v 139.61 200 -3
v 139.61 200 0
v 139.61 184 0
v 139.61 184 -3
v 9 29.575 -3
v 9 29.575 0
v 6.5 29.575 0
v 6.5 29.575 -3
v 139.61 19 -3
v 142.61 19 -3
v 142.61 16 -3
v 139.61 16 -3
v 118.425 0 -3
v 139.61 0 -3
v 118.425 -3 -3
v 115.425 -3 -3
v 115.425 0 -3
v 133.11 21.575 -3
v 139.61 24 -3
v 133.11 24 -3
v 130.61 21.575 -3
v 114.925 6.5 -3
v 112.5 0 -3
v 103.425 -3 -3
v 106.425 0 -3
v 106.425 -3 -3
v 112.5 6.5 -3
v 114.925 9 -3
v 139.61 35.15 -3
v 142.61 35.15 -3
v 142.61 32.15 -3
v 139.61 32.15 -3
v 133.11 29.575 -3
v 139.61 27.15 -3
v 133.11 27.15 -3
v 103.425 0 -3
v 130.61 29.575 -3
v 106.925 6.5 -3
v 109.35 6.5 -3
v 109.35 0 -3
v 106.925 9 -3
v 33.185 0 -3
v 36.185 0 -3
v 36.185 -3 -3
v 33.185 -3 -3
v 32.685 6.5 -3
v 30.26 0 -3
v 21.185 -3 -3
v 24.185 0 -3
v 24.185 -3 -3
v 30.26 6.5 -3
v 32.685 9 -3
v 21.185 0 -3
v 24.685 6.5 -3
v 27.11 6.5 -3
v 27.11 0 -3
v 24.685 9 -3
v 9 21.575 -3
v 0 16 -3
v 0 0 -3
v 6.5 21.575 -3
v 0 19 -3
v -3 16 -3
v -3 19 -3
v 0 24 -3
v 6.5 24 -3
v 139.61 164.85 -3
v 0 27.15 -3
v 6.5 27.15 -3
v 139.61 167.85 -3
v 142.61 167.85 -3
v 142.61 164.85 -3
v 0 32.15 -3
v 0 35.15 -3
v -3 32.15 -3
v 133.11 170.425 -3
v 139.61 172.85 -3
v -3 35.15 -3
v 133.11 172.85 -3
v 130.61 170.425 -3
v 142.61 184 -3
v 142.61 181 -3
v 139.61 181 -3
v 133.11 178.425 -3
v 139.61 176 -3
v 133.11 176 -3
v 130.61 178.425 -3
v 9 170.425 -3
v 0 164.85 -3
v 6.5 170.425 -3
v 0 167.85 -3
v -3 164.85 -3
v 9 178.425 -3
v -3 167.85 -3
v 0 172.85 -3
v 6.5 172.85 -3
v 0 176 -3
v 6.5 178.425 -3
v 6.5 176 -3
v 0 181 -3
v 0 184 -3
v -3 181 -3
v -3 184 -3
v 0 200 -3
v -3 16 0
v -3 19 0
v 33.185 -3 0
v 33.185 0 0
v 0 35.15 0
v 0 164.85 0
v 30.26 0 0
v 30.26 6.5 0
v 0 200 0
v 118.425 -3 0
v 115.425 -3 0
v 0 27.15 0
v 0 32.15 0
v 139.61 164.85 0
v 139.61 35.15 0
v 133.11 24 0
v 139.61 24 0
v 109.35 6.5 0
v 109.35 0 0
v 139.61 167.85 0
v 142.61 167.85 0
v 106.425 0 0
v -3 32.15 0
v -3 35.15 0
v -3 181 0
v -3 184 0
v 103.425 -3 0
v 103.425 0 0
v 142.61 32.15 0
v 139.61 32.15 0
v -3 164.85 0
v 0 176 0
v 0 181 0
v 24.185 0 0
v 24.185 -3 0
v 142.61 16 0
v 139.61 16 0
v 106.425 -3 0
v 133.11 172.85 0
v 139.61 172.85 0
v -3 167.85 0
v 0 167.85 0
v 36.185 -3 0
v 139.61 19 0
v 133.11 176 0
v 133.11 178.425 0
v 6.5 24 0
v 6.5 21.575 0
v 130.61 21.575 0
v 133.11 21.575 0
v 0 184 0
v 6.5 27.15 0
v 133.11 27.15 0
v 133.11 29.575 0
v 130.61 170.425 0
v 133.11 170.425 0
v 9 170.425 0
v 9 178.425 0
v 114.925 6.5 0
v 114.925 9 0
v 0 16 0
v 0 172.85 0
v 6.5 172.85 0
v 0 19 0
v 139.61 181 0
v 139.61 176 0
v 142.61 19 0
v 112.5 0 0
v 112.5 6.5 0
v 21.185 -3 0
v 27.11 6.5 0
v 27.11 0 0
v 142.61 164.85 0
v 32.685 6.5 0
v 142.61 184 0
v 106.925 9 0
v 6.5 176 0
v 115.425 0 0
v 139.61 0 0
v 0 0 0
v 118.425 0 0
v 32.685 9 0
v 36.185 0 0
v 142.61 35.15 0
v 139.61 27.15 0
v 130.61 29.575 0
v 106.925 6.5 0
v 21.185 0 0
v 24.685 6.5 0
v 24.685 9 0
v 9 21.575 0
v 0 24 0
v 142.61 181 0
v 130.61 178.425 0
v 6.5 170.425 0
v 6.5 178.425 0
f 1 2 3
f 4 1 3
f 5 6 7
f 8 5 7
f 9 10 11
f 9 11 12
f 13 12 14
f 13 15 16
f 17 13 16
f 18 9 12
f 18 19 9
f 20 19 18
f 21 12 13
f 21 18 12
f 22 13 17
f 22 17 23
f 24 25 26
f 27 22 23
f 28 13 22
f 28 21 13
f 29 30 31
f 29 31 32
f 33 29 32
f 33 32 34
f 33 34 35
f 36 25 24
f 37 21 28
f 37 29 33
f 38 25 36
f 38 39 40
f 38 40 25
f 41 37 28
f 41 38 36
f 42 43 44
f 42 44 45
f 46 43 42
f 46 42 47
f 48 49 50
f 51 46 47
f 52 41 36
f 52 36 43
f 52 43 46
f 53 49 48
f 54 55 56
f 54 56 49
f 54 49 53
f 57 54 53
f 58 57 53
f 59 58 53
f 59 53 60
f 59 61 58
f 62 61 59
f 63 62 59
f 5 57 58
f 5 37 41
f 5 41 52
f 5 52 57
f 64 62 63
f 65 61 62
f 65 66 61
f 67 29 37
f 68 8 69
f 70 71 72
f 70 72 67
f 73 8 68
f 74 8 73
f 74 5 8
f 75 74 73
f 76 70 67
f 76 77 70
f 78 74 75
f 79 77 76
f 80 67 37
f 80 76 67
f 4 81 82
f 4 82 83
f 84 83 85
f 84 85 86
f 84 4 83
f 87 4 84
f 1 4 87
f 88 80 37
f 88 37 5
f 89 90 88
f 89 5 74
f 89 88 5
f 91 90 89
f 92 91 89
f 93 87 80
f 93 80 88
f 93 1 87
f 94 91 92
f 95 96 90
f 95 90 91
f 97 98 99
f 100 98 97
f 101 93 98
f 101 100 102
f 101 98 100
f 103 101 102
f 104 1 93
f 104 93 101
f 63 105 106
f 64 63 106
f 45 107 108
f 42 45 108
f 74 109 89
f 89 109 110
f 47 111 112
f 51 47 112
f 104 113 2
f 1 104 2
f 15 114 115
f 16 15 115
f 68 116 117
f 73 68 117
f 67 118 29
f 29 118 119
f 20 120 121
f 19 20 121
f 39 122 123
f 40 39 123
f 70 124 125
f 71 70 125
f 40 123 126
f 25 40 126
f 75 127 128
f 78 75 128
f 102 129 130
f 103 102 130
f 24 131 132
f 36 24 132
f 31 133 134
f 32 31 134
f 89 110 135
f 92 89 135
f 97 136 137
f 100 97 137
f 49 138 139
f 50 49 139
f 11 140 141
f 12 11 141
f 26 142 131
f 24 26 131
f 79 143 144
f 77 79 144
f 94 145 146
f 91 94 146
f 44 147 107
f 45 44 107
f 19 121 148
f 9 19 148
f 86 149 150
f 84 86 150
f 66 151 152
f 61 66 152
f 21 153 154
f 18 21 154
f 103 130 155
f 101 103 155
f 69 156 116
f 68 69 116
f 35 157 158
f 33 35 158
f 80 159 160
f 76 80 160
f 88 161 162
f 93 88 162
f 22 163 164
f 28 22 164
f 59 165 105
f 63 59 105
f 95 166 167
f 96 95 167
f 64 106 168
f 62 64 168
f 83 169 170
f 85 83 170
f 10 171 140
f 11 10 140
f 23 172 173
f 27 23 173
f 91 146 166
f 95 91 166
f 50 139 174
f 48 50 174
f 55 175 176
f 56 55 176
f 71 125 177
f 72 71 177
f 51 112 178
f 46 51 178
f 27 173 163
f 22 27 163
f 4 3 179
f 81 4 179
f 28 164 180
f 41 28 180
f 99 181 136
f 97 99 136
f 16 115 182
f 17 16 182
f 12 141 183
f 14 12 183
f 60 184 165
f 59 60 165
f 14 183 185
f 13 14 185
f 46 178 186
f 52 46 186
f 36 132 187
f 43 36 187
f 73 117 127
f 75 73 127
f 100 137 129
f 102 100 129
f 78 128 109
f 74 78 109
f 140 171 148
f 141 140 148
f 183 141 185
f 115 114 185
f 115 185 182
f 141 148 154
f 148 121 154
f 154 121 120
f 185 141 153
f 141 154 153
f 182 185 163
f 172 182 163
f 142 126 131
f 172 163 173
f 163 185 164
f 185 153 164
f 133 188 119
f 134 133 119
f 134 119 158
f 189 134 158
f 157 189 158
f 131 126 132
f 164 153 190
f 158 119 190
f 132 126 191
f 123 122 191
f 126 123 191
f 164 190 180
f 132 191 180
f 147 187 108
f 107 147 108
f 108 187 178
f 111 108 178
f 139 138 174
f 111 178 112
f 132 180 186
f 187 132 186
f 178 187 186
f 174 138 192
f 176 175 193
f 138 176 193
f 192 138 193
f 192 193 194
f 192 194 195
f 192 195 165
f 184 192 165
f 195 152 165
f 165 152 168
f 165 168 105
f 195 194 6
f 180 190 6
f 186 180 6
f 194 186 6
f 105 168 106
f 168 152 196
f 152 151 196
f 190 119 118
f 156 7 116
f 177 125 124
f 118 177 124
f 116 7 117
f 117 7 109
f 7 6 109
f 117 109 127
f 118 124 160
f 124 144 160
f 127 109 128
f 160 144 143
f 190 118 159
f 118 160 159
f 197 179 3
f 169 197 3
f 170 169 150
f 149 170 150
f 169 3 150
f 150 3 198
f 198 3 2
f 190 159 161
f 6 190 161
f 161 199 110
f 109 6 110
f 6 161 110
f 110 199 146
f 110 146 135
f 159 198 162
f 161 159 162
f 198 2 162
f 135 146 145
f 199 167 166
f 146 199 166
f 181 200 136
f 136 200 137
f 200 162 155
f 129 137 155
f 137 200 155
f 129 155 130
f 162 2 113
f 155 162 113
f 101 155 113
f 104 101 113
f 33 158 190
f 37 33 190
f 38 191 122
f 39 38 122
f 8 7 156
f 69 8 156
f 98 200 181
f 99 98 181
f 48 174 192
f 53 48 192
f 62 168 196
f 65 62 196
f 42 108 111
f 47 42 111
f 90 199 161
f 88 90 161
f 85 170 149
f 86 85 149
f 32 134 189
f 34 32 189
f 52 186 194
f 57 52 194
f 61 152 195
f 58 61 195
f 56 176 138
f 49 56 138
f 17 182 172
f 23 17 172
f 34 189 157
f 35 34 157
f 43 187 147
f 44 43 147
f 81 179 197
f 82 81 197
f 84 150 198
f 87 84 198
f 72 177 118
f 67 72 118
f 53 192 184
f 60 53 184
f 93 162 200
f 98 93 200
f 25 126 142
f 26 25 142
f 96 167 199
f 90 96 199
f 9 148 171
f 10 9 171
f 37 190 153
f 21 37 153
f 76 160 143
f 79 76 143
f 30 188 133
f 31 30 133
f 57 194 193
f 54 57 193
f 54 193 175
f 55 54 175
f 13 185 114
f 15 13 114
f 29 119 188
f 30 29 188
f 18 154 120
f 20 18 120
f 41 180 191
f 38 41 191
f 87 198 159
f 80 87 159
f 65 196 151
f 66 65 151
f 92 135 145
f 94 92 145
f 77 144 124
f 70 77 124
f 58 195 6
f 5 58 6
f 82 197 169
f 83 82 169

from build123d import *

# Parameters (mm, degrees)
BOSS_EXTRUDE1_DEPTH = 3


with BuildPart() as part:
    # Sketch1 → Boss-Extrude1 (new body)
    with BuildSketch(Plane.XY):
        Polygon((0, 27.15), (0, 32.15), (-3, 32.15), (-3, 35.15), (0, 35.15), (0, 164.85), (-3, 164.85), (-3, 167.85), (0, 167.85), (0, 172.85), (6.5, 172.85), (6.5, 170.425), (9, 170.425), (9, 178.425), (6.5, 178.425), (6.5, 176), (0, 176), (0, 181), (-3, 181), (-3, 184), (0, 184), (0, 200), (139.61, 200), (139.61, 184), (142.61, 184), (142.61, 181), (139.61, 181), (139.61, 176), (133.11, 176), (133.11, 178.425), (130.61, 178.425), (130.61, 170.425), (133.11, 170.425), (133.11, 172.85), (139.61, 172.85), (139.61, 167.85), (142.61, 167.85), (142.61, 164.85), (139.61, 164.85), (139.61, 35.15), (142.61, 35.15), (142.61, 32.15), (139.61, 32.15), (139.61, 27.15), (133.11, 27.15), (133.11, 29.575), (130.61, 29.575), (130.61, 21.575), (133.11, 21.575), (133.11, 24), (139.61, 24), (139.61, 19), (142.61, 19), (142.61, 16), (139.61, 16), (139.61, 0), (118.425, 0), (118.425, -3), (115.425, -3), (115.425, 0), (112.5, 0), (112.5, 6.5), (114.925, 6.5), (114.925, 9), (106.925, 9), (106.925, 6.5), (109.35, 6.5), (109.35, 0), (106.425, 0), (106.425, -3), (103.425, -3), (103.425, 0), (36.185, 0), (36.185, -3), (33.185, -3), (33.185, 0), (30.26, 0), (30.26, 6.5), (32.685, 6.5), (32.685, 9), (24.685, 9), (24.685, 6.5), (27.11, 6.5), (27.11, 0), (24.185, 0), (24.185, -3), (21.185, -3), (21.185, 0), (0, 0), (0, 16), (-3, 16), (-3, 19), (0, 19), (0, 24), (6.5, 24), (6.5, 21.575), (9, 21.575), (9, 29.575), (6.5, 29.575), (6.5, 27.15), align=None)
    extrude(amount=-BOSS_EXTRUDE1_DEPTH)


solid = part.part
